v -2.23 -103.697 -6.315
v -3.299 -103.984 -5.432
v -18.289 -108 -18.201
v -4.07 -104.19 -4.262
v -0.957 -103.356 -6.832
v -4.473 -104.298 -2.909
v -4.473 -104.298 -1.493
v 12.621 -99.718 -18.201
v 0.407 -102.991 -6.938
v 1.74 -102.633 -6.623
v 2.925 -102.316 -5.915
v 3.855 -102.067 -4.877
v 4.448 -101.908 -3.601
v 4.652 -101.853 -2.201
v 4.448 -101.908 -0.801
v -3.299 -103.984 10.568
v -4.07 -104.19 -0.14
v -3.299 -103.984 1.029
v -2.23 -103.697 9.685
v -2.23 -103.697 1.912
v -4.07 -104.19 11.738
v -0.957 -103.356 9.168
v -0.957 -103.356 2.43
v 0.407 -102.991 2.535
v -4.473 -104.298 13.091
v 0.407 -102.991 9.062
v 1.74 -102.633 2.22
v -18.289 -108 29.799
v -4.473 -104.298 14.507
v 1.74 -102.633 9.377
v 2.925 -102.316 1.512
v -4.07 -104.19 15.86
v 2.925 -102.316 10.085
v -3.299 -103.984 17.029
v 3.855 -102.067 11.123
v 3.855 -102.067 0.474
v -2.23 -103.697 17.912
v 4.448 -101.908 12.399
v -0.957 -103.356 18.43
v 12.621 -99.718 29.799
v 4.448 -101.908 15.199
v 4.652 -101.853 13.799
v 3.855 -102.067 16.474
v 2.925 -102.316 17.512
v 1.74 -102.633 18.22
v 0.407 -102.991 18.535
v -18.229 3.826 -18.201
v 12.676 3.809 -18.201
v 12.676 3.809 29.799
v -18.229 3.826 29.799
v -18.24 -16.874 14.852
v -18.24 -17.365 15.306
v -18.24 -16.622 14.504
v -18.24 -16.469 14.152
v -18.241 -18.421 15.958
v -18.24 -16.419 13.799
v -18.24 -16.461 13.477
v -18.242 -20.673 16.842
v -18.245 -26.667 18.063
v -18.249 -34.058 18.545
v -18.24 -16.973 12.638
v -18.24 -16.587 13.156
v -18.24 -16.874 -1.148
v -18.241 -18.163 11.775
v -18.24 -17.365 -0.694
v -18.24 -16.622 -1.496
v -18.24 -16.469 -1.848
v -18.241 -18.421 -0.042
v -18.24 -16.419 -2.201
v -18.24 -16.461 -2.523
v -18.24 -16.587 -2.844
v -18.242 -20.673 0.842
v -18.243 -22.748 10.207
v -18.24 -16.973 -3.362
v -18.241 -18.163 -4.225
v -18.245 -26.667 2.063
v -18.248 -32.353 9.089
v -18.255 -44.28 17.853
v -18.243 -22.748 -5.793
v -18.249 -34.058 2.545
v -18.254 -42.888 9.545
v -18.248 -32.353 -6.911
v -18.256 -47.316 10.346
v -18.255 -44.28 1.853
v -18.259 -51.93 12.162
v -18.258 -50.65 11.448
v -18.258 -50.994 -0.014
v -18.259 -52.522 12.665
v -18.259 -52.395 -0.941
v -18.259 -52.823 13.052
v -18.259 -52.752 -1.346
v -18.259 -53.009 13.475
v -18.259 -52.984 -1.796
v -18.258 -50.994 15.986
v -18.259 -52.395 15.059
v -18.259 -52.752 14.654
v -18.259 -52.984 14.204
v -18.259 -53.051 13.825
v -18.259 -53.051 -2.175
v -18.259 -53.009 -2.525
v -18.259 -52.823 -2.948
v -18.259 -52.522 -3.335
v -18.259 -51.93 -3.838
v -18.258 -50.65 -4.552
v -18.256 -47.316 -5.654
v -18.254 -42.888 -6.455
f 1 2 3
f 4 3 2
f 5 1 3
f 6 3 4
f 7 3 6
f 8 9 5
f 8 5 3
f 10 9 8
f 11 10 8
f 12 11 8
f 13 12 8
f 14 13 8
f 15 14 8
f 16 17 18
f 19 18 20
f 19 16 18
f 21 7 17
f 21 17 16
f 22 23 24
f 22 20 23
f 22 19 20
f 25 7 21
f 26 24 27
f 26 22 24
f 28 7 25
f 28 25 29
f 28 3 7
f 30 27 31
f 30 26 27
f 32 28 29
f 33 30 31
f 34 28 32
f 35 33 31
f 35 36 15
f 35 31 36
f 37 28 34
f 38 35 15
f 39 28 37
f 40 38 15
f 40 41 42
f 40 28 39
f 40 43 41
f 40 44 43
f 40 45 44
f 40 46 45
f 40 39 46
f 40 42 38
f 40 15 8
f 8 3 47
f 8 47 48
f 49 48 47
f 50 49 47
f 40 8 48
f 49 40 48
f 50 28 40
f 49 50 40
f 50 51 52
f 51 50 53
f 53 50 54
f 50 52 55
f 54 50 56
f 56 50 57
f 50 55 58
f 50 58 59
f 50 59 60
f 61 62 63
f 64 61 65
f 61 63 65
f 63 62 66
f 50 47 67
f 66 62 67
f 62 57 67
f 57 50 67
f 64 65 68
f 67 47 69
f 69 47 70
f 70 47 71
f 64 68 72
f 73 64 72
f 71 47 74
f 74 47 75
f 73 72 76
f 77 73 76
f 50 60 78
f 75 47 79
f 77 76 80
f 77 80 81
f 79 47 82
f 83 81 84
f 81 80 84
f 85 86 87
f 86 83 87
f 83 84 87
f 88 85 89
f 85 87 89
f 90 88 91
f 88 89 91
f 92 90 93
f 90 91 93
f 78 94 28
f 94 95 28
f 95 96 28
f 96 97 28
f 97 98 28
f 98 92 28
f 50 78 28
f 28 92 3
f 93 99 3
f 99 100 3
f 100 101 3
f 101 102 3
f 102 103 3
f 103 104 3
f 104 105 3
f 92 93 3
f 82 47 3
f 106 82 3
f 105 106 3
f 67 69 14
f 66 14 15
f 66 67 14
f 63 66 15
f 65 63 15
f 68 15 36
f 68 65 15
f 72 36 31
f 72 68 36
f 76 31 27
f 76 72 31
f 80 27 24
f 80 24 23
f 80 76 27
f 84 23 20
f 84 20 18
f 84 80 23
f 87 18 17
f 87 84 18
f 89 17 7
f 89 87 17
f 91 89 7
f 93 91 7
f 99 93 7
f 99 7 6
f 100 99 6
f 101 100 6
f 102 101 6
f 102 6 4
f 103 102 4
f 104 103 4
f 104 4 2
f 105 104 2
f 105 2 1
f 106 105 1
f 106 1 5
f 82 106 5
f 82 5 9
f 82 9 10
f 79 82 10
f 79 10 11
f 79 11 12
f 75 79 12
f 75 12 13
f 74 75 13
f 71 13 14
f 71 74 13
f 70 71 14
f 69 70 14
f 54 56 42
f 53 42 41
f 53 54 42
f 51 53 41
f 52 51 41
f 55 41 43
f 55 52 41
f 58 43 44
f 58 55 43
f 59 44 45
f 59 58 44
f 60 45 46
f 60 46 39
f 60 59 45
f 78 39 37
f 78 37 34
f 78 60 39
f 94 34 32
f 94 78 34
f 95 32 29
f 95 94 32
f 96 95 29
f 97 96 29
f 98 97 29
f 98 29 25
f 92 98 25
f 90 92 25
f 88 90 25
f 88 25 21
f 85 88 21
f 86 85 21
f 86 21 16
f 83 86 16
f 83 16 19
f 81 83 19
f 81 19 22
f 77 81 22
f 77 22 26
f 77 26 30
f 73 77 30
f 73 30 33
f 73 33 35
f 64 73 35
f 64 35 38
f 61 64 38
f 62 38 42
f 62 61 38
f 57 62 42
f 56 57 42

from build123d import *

# Parameters (mm, degrees)
F0_W      = 60
F0_H      = 48
F0_R      = 4.75
F1_DEPTH  = 108
F3_DEPTH  = 48
F5_DEPTH  = 48
F7_DEPTH  = 48
F9_DEPTH  = 48
F10_ANGLE = -15


with BuildPart() as f1:
    # F0 (on Front) → F1 (new body)
    with BuildSketch(Plane.XZ):
        with Locations((11.7113751173, 5.7986730486)):
            Rectangle(F0_W, F0_H)
        with Locations((0.7113751173, -2.2013269514)):
            Circle(F0_R, mode=Mode.SUBTRACT)
        with Locations((0.7113751173, 13.7986730486)):
            Circle(F0_R, mode=Mode.SUBTRACT)
    extrude(amount=F1_DEPTH)

    # F2 (on face) → F3 (cut)
    with BuildSketch(Plane(origin=(0, 0, -18.2013269514), x_dir=(1, 0, 0), z_dir=(0, 0, -1))):
        Polygon((10.7113751173, 0), (-18.2886248827, 108), (-18.2886248827, 0), align=None)
    extrude(amount=-F3_DEPTH, mode=Mode.SUBTRACT)

    # F4 (on face) → F5 (cut)
    with BuildSketch(Plane(origin=(0, 0, -18.2013269514), x_dir=(1, 0, 0), z_dir=(0, 0, -1))):
        Polygon((41.7113751173, 108), (41.7113751173, 3.724137931), (42.3088373496, 1.4991061694), (42.3088373496, 108), align=None)
        Polygon((41.7113751173, 108), (13.7113751173, 108), (41.7113751173, 3.724137931), align=None)
    extrude(amount=-F5_DEPTH, mode=Mode.SUBTRACT)

    # F6 (on face) → F7 (cut)
    with BuildSketch(Plane(origin=(0, 0, -18.2013269514), x_dir=(1, 0, 0), z_dir=(0, 0, -1))):
        Polygon((41.7113751173, 3.724137931), (10.7113751173, 0), (41.7113751173, 0), align=None)
    extrude(amount=-F7_DEPTH, mode=Mode.SUBTRACT)

    # F8 (on face) → F9 (cut)
    with BuildSketch(Plane(origin=(0, 0, -18.2013269514), x_dir=(1, 0, 0), z_dir=(0, 0, -1))):
        Polygon((40.559275957, 8.0147141144), (10.7113751173, 0), (42.3792054196, 1.2370457707), align=None)
    extrude(amount=-F9_DEPTH, mode=Mode.SUBTRACT)


with BuildPart() as f1_1:
    # F10: moved
    add(f1.part.rotate(Axis((-18.2886248827, -108, 5.7986730486), (0, 0, -1)), F10_ANGLE))


solid = f1_1.part
